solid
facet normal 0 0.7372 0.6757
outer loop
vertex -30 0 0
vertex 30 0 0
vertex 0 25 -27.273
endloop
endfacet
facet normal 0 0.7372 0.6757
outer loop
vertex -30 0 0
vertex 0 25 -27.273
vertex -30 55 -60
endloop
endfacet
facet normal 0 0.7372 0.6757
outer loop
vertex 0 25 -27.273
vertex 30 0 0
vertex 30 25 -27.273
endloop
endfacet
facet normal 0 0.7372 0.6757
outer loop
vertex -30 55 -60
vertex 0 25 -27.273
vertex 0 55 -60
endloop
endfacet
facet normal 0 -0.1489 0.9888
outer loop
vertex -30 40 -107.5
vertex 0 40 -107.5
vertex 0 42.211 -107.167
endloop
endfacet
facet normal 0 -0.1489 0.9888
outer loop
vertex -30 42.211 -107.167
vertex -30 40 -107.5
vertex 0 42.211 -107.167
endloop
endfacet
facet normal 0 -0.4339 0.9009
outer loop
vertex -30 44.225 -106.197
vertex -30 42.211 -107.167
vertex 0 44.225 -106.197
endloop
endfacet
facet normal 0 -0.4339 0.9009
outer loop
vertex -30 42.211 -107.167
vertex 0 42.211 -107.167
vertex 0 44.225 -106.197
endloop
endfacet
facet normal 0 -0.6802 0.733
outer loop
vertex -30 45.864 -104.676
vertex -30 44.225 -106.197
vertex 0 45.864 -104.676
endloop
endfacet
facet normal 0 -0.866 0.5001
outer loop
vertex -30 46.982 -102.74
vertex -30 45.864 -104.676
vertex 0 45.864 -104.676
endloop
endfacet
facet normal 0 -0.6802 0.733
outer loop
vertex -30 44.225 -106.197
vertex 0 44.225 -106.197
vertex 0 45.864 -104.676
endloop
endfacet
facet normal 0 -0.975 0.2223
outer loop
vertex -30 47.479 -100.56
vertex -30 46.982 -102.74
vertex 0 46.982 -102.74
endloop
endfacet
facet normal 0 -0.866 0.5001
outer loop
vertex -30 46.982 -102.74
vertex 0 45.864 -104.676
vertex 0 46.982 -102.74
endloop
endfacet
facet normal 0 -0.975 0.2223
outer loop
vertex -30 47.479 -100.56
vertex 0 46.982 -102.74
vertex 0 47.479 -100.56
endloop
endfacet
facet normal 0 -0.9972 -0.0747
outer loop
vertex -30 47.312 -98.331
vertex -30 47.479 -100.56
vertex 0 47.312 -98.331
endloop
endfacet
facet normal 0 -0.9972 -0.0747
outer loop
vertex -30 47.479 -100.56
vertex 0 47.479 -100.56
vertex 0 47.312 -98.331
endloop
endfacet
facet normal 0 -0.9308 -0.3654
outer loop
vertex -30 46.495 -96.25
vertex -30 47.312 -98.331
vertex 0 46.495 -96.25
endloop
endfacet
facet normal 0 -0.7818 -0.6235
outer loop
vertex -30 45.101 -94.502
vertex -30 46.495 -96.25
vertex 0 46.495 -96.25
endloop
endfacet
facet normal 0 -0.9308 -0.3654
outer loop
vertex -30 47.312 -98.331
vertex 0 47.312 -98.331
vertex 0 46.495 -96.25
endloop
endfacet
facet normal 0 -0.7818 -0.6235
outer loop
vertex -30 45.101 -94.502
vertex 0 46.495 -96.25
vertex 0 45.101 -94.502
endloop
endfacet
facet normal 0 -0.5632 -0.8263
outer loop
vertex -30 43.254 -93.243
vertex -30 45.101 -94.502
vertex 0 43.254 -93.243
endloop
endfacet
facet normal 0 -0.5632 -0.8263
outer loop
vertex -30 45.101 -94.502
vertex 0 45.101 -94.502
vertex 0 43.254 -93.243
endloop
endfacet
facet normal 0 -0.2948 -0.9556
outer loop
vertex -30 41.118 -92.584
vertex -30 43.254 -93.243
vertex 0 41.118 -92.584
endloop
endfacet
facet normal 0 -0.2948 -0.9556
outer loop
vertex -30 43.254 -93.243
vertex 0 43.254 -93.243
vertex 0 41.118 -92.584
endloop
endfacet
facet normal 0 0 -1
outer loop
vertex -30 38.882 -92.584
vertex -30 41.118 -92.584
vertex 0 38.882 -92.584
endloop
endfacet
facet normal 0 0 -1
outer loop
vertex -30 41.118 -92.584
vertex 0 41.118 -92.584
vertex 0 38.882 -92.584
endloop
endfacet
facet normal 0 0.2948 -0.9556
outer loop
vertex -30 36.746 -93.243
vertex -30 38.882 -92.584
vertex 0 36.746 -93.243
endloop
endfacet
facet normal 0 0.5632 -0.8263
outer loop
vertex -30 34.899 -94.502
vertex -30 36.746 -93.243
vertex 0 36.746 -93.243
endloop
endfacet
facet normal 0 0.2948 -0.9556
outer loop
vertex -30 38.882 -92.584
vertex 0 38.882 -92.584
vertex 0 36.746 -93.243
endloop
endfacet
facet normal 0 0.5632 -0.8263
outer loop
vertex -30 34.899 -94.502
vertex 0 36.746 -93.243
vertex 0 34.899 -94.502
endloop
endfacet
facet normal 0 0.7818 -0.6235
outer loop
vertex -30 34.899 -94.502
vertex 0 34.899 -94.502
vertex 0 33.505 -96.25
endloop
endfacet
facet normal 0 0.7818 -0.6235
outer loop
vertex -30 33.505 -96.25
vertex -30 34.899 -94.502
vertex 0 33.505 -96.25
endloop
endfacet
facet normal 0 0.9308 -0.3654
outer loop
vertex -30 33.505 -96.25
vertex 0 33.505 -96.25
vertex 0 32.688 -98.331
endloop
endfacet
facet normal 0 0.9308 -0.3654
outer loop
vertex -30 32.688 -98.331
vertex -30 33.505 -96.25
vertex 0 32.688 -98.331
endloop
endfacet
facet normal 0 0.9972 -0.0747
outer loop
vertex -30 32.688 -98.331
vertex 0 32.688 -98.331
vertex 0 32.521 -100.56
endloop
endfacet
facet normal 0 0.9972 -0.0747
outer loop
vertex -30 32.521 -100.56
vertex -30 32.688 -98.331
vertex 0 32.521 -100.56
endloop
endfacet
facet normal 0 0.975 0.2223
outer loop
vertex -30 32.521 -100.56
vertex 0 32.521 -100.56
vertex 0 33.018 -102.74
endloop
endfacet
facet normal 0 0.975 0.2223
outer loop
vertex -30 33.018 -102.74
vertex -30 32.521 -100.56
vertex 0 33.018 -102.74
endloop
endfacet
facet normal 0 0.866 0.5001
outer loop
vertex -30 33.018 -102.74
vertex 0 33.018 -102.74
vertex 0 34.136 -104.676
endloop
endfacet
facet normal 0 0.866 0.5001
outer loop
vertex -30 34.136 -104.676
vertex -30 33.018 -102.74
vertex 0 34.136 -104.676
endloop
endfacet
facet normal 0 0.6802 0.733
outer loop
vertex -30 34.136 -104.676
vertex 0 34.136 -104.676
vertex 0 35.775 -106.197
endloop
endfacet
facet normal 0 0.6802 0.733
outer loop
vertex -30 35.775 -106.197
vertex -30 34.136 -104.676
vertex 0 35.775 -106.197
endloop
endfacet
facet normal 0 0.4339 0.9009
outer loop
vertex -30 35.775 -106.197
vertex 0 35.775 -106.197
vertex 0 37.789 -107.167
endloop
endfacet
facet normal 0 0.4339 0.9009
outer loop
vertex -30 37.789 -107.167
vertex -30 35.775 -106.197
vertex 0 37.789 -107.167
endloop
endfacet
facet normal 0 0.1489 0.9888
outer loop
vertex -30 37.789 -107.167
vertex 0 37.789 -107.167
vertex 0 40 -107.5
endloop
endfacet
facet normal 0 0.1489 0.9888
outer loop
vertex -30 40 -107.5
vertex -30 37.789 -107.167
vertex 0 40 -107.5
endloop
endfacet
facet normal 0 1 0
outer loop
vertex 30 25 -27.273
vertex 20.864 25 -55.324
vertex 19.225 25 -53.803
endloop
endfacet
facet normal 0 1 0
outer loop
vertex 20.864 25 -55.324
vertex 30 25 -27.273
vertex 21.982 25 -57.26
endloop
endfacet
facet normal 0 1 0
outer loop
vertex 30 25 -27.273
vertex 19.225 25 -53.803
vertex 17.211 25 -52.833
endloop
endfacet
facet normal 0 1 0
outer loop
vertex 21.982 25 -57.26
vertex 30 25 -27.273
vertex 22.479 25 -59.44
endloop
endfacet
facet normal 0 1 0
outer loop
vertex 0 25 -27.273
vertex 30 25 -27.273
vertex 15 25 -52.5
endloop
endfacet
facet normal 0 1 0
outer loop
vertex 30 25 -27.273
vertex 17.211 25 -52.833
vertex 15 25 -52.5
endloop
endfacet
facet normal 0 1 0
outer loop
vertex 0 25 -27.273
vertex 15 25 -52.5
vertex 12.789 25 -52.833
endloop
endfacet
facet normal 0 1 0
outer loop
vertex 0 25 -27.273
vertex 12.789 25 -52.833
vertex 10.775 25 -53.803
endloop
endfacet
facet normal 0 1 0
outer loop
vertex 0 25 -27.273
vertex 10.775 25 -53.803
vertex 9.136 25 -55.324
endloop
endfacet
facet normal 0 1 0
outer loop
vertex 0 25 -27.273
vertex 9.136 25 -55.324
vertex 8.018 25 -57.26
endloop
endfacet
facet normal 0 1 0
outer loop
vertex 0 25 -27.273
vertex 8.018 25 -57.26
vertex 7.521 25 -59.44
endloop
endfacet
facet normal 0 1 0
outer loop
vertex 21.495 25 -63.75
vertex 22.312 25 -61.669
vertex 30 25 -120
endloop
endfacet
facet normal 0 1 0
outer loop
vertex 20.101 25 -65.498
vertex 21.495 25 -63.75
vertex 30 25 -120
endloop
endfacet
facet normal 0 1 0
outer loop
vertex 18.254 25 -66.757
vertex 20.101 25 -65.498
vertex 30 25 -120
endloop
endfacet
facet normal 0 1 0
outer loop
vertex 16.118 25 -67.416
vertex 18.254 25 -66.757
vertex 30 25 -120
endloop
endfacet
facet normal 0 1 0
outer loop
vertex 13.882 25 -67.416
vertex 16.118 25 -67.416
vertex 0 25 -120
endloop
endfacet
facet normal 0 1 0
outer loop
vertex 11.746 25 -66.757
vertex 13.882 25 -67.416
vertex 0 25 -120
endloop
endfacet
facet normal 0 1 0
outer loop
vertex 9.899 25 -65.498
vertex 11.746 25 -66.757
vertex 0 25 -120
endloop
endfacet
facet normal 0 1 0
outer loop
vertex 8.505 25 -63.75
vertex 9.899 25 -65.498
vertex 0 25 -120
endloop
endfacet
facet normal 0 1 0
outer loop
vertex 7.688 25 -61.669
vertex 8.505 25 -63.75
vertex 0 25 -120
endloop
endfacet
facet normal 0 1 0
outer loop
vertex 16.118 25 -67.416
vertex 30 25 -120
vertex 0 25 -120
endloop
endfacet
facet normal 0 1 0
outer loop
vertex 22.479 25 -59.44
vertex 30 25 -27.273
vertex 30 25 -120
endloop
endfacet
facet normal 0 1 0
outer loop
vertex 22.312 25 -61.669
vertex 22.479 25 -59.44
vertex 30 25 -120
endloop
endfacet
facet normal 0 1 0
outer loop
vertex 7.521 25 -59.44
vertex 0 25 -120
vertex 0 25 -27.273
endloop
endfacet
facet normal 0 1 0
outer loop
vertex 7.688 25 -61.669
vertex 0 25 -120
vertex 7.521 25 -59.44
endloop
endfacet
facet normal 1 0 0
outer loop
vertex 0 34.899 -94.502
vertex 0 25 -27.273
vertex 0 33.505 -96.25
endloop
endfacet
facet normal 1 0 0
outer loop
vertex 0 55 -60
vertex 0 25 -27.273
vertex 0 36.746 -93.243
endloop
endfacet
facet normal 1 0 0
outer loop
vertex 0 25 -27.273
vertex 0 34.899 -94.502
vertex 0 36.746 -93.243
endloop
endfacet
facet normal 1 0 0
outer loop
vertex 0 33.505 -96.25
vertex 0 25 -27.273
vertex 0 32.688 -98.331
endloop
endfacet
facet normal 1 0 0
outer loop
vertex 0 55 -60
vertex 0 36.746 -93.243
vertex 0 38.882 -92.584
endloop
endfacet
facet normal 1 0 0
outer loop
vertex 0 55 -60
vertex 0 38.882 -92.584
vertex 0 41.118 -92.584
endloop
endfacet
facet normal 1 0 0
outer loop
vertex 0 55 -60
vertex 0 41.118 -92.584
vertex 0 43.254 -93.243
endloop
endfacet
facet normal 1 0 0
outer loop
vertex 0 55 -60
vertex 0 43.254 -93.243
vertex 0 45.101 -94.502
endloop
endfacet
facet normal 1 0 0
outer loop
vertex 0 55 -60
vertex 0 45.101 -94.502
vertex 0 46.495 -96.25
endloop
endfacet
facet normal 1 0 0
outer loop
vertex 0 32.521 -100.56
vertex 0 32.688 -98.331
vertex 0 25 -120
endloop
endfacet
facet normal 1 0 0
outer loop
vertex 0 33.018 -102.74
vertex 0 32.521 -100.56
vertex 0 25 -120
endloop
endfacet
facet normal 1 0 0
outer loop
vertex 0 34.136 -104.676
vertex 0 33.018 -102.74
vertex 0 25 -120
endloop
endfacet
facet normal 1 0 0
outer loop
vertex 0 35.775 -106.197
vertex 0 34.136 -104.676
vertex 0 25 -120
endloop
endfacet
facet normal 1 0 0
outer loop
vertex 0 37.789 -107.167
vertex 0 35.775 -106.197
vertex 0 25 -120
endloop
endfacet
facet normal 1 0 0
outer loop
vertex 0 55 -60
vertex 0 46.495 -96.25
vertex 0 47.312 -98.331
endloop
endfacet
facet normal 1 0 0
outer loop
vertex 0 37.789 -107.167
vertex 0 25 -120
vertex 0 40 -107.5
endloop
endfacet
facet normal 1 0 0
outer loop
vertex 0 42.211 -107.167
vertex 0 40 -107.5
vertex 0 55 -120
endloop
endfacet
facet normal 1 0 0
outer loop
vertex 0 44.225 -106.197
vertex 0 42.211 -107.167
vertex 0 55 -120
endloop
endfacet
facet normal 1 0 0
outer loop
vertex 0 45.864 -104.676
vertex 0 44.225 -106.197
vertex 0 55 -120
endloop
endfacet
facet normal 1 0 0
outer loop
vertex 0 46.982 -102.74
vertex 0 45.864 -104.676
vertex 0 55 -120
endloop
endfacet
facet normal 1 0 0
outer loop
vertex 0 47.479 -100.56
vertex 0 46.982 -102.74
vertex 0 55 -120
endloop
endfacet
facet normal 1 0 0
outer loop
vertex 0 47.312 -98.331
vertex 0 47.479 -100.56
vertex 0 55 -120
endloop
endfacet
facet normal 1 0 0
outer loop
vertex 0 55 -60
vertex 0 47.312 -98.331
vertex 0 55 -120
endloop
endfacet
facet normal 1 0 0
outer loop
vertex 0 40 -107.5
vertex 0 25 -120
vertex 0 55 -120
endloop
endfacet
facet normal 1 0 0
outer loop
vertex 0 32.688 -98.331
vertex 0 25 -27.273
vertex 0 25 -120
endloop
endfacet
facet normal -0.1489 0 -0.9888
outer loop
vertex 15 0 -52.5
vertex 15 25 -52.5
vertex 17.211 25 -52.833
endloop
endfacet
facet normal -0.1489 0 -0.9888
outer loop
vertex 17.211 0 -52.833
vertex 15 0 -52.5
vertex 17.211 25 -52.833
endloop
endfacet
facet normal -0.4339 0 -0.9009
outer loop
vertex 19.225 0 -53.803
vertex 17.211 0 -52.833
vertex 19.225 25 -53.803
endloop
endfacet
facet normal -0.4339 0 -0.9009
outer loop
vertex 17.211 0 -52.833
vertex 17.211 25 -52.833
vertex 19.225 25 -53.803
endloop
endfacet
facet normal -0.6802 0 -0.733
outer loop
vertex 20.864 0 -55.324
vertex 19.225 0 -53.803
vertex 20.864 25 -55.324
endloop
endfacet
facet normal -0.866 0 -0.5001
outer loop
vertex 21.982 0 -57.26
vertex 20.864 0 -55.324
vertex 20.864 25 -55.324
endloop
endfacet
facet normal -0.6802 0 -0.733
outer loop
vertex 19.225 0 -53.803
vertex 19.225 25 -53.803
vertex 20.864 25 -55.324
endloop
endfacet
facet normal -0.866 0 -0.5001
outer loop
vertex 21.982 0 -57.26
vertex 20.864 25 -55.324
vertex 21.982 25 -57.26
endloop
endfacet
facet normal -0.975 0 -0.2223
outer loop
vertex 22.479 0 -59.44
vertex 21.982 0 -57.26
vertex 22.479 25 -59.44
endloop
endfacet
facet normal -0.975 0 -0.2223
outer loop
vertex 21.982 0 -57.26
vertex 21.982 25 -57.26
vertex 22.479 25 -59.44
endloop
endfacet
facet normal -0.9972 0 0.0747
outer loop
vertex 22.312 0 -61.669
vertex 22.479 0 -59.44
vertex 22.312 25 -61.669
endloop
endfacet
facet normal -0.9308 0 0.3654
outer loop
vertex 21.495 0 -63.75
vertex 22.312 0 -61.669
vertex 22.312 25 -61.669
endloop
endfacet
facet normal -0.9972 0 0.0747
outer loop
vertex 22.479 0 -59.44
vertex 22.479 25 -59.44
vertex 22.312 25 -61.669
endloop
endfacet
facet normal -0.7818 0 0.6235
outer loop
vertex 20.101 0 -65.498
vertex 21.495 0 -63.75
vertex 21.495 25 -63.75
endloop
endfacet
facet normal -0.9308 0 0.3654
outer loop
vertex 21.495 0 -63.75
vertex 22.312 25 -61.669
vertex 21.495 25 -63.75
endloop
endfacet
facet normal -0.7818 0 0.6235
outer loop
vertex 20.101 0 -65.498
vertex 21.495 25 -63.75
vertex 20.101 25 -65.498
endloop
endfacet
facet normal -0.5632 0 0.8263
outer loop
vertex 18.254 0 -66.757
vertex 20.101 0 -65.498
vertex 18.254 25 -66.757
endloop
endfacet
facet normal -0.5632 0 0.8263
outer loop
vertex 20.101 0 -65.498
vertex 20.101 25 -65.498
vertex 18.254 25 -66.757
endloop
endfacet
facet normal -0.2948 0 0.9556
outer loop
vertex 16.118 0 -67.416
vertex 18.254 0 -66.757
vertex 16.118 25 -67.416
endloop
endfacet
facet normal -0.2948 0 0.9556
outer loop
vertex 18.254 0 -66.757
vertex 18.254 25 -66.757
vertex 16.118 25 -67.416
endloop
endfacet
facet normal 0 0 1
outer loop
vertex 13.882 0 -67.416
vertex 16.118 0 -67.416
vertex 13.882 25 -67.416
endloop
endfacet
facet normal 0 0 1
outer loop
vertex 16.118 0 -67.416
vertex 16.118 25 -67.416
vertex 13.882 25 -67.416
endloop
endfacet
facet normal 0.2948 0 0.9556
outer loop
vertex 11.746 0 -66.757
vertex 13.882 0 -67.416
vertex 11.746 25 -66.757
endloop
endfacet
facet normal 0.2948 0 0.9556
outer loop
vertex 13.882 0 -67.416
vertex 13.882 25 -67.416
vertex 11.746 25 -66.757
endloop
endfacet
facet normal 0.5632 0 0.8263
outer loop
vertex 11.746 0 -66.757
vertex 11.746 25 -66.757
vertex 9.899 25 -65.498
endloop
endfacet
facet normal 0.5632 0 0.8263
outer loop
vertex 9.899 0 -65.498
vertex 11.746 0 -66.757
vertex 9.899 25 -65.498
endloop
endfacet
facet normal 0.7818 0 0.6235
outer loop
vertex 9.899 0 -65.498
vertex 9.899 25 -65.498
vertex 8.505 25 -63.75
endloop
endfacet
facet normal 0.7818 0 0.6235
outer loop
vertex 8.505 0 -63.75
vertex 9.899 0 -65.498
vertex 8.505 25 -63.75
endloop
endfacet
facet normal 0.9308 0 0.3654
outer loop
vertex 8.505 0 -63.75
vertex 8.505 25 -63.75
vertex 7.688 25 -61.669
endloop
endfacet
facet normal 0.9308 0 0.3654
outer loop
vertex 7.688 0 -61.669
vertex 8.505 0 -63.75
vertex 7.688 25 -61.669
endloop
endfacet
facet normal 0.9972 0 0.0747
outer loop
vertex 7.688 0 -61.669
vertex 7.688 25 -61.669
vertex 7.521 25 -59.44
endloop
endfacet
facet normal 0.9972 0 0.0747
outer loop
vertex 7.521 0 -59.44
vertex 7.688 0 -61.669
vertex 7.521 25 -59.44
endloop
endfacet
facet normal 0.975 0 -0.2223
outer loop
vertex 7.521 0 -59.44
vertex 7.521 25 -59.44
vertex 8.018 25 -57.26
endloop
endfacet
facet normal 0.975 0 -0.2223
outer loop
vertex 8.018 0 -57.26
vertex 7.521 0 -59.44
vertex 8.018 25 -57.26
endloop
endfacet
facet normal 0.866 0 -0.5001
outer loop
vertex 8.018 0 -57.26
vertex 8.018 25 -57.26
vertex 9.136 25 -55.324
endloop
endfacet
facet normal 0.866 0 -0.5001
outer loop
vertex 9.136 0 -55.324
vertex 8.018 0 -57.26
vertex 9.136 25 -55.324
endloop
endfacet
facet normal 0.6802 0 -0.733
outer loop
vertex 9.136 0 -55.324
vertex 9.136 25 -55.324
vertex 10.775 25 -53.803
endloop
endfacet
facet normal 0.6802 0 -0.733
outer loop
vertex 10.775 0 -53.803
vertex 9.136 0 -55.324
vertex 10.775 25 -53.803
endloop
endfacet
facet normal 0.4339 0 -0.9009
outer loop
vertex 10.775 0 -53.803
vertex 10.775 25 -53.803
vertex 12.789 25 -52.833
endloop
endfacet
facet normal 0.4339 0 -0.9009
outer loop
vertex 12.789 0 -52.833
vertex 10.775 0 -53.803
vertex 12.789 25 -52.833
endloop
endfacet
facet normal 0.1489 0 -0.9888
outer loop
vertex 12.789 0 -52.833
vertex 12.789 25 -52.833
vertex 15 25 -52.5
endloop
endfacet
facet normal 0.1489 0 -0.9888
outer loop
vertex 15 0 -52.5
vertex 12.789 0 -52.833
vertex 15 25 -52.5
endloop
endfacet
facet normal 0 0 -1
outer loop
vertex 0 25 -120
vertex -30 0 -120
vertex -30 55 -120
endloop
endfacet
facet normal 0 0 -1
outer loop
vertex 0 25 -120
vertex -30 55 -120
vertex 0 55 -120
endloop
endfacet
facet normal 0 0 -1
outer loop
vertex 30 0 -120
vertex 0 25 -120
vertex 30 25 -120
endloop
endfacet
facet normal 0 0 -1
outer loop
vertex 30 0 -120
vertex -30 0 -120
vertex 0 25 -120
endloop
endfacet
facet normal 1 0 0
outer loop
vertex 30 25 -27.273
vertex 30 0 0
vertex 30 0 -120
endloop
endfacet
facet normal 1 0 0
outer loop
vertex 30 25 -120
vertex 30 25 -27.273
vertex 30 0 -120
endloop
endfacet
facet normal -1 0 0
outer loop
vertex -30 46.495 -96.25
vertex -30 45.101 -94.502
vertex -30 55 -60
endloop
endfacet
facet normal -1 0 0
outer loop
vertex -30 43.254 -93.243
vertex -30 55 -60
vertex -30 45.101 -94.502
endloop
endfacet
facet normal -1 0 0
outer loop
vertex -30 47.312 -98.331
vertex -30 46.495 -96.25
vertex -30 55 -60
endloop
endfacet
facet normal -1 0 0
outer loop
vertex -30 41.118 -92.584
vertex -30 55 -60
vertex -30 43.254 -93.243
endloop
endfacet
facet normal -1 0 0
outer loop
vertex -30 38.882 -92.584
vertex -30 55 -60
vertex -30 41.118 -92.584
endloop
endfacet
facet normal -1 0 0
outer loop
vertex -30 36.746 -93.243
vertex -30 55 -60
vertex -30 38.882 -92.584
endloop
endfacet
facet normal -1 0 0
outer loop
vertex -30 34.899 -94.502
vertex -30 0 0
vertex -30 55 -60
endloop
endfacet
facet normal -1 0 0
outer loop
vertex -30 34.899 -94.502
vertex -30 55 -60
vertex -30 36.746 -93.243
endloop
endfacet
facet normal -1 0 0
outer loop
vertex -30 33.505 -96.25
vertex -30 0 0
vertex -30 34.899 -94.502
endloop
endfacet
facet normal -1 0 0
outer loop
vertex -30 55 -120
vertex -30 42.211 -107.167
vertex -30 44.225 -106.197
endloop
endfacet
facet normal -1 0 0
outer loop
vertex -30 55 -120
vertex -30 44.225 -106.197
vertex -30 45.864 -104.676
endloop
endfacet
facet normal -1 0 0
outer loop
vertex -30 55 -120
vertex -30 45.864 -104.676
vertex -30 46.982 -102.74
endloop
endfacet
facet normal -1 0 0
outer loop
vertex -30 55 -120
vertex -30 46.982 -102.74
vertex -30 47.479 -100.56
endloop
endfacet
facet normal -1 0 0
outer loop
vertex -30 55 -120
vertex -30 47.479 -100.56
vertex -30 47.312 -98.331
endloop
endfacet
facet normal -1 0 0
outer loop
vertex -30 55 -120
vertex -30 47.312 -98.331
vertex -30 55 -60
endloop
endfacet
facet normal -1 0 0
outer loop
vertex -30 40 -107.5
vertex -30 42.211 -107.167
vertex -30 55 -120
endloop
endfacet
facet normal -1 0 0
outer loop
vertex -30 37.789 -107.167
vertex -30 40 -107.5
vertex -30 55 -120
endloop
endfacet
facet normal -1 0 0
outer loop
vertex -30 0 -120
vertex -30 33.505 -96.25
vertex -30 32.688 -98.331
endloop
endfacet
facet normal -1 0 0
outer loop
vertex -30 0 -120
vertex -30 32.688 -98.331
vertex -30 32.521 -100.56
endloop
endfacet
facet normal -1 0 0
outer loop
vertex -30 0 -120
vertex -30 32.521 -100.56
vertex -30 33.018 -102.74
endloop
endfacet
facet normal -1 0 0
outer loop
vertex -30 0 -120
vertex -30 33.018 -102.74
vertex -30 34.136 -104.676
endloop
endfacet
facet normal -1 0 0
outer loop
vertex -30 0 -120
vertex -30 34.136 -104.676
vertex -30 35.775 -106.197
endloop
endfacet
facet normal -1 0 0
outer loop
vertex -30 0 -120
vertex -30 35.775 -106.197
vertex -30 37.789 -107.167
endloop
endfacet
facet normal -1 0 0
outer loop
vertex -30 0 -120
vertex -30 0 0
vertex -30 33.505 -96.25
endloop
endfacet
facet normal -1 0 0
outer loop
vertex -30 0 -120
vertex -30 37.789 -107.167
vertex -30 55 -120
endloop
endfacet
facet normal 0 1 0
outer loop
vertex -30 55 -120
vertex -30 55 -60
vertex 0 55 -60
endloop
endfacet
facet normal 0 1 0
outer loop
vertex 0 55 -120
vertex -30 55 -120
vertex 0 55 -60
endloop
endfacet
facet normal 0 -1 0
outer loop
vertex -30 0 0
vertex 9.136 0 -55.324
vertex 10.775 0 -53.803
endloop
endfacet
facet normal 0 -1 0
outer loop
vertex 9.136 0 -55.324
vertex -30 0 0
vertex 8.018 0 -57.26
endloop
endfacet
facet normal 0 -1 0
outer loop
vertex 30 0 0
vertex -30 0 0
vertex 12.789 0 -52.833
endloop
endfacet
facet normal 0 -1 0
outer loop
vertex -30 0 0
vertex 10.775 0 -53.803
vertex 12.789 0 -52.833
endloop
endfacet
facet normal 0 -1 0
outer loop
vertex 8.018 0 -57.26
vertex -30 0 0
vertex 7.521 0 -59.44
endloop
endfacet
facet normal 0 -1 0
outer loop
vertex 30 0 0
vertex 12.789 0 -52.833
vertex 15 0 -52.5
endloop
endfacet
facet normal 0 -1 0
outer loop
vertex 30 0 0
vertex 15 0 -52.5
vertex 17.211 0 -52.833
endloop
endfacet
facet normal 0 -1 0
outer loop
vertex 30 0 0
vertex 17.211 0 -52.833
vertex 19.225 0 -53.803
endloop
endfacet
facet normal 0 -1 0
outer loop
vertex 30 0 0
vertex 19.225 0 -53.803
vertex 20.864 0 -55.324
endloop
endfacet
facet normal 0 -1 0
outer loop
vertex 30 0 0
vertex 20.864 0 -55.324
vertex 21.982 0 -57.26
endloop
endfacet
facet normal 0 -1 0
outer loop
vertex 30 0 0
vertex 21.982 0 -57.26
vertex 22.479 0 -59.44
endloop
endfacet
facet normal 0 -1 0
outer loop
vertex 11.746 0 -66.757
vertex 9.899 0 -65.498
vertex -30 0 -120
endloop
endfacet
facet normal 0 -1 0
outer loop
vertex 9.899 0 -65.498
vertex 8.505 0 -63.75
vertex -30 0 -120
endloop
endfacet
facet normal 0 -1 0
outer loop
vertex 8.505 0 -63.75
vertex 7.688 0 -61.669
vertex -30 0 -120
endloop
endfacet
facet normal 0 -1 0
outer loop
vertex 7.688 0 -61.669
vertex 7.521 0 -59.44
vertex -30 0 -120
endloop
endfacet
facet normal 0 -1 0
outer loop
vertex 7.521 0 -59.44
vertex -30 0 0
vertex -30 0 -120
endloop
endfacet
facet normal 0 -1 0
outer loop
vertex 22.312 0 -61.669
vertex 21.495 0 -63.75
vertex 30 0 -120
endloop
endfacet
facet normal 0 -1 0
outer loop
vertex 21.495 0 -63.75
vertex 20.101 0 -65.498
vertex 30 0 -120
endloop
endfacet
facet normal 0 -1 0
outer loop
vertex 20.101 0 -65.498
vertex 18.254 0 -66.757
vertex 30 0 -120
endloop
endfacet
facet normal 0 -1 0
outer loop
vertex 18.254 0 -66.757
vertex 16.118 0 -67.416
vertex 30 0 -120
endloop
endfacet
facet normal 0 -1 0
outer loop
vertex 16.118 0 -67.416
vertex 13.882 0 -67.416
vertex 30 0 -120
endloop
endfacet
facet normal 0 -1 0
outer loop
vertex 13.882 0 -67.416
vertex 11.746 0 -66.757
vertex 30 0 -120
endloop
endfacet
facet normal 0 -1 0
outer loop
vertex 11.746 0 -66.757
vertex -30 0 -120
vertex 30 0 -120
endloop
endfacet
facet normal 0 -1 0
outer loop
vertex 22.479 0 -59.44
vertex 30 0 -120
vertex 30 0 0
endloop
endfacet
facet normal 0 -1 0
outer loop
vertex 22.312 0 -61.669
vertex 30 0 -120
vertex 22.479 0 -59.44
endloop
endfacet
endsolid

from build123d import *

# Parameters (mm, degrees)
SKETCH1_W           = 60
SKETCH1_H           = 120
BOSS_EXTRUDE1_DEPTH = 55
CUT_EXTRUDE1_DEPTH  = 146
SKETCH3_W           = 30
SKETCH3_H           = 30
CUT_EXTRUDE2_DEPTH  = 136.369863707
SKETCH5_R           = 7.5
CUT_EXTRUDE3_DEPTH  = 136.369863707
SKETCH6_R           = 7.5
CUT_EXTRUDE4_DEPTH  = 128.279220614


with BuildPart() as part:
    # Sketch1 → Boss-Extrude1 (new body)
    with BuildSketch(Plane(origin=(0, 0, 0), x_dir=(1, 0, 0), z_dir=(0, 1, 0))):
        with Locations((0, 60)):
            Rectangle(SKETCH1_W, SKETCH1_H)
    extrude(amount=BOSS_EXTRUDE1_DEPTH)

    # Sketch2 → Cut-Extrude1 (cut, through all)
    with BuildSketch(Plane(origin=(30, 0, 0), x_dir=(0, 0, -1), z_dir=(1, 0, 0))):
        Polygon((0, 0), (60, 55), (0, 55), align=None)
    extrude(amount=-CUT_EXTRUDE1_DEPTH, mode=Mode.SUBTRACT)

    # Sketch3 → Cut-Extrude2 (cut, through all)
    with BuildSketch(Plane(origin=(0, 0, -120), x_dir=(-1, 0, 0), z_dir=(0, 0, -1))):
        with Locations((-15, 40)):
            Rectangle(SKETCH3_W, SKETCH3_H)
    extrude(amount=-CUT_EXTRUDE2_DEPTH, mode=Mode.SUBTRACT)

    # Sketch5 → Cut-Extrude3 (cut, through all)
    with BuildSketch(Plane(origin=(0, 0, 0), x_dir=(0, 0, -1), z_dir=(1, 0, 0))):
        with Locations((100, 40)):
            Circle(SKETCH5_R)
    extrude(amount=-CUT_EXTRUDE3_DEPTH, mode=Mode.SUBTRACT)

    # Sketch6 → Cut-Extrude4 (cut, through all)
    with BuildSketch(Plane(origin=(0, 25, 0), x_dir=(1, 0, 0), z_dir=(0, 1, 0))):
        with Locations(Location((15, 60, 0), (0, 0, 270))):
            Circle(SKETCH6_R)
    extrude(amount=-CUT_EXTRUDE4_DEPTH, mode=Mode.SUBTRACT)


solid = part.part
